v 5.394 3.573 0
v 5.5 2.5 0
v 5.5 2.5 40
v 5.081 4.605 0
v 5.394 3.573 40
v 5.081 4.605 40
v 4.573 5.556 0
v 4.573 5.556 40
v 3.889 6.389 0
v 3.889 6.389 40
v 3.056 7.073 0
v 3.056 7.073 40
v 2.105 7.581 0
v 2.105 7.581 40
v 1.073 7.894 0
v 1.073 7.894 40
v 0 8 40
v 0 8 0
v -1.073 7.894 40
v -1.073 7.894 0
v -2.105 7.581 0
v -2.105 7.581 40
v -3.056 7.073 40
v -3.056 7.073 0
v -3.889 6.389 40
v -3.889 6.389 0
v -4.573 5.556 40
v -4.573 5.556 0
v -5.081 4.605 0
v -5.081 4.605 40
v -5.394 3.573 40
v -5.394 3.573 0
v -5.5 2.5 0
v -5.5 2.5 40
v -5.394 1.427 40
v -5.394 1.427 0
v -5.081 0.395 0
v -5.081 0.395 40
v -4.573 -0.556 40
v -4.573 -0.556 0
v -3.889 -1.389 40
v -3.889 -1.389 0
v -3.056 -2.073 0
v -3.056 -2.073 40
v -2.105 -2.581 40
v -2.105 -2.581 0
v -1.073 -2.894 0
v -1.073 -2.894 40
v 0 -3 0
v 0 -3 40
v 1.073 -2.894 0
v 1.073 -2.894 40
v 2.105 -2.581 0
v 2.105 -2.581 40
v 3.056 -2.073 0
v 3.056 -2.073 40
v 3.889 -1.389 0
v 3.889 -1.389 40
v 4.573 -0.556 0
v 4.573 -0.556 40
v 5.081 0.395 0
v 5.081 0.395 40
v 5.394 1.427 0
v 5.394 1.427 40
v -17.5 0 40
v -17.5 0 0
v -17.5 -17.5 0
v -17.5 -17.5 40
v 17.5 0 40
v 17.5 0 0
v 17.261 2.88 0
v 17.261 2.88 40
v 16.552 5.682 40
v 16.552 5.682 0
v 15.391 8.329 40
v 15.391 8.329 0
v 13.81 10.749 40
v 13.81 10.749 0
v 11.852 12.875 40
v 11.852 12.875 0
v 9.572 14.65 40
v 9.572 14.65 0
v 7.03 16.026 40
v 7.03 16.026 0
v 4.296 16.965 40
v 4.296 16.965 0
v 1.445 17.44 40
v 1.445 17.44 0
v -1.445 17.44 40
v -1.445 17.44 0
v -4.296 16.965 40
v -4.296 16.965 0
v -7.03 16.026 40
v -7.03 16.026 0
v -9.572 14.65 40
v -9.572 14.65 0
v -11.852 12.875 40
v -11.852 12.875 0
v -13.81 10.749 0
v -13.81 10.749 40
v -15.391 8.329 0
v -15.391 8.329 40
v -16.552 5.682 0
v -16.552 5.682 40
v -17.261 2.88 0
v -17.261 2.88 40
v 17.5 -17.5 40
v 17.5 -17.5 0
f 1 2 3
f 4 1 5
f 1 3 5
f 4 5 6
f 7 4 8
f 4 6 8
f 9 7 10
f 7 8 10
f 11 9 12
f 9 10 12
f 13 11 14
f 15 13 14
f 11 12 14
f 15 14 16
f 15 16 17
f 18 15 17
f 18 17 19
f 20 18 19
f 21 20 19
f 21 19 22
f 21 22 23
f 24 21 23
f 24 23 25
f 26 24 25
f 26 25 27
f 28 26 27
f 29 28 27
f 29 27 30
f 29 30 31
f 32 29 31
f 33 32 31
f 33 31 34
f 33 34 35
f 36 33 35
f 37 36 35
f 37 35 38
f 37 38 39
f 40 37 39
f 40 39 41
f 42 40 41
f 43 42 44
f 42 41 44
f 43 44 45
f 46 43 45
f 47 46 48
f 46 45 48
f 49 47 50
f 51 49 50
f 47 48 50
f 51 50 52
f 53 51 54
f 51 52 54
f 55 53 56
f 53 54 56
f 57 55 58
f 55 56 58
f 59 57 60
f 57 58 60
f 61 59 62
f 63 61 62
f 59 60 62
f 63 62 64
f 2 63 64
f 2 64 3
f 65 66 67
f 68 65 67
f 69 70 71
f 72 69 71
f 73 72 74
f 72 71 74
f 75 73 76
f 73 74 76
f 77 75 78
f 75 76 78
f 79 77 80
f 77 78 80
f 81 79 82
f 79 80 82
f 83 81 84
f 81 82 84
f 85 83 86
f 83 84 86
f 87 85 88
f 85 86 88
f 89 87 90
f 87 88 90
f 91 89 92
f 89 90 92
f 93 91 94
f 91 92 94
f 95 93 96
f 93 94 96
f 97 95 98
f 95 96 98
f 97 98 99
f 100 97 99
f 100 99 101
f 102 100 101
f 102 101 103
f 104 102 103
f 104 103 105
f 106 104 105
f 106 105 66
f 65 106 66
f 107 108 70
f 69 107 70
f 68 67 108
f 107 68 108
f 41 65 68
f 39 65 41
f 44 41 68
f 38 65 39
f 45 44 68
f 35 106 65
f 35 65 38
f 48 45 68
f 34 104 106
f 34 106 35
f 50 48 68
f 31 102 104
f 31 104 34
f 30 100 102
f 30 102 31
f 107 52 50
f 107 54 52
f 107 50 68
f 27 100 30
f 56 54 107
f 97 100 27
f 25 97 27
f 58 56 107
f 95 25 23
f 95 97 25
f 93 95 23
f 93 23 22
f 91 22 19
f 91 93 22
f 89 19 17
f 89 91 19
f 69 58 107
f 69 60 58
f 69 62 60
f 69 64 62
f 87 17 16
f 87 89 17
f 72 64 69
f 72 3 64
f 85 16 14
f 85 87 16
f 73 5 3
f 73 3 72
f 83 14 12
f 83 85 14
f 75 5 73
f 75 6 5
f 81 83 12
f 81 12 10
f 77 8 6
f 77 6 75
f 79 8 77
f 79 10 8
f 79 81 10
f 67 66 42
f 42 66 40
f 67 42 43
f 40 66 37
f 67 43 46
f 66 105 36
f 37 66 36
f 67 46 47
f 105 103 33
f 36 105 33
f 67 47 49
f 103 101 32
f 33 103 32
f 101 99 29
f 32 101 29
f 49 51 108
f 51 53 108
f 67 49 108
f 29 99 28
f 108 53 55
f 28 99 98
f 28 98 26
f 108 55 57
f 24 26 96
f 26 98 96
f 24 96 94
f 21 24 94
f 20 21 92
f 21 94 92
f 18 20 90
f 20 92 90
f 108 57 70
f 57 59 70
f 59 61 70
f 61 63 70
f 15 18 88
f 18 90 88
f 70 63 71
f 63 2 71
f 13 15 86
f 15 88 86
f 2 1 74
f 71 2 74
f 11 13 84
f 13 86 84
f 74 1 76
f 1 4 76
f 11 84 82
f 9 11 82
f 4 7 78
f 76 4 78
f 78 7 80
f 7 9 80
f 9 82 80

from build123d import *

# Parameters (mm, degrees)
PAD_DEPTH   = 40
SKETCH001_R = 5.5
HOLE_DEPTH  = 40.001


with BuildPart() as part:
    # Sketch → Pad (new body)
    with BuildSketch(Plane.XY):
        with BuildLine():
            Line((-17.5, 0), (-17.5, -17.5))
            Line((-17.5, -17.5), (17.5, -17.5))
            Line((17.5, -17.5), (17.5, 0))
            ThreePointArc((17.5, 0), (0, 17.5), (-17.5, 0))
        make_face()
    extrude(amount=PAD_DEPTH)

    # Sketch001 (on Face6 of Pad) → Hole (cut, through all)
    with BuildSketch(Plane.XY.offset(40)):
        with Locations((0, 2.5)):
            Circle(SKETCH001_R)
    extrude(amount=-HOLE_DEPTH, mode=Mode.SUBTRACT)


solid = part.part
